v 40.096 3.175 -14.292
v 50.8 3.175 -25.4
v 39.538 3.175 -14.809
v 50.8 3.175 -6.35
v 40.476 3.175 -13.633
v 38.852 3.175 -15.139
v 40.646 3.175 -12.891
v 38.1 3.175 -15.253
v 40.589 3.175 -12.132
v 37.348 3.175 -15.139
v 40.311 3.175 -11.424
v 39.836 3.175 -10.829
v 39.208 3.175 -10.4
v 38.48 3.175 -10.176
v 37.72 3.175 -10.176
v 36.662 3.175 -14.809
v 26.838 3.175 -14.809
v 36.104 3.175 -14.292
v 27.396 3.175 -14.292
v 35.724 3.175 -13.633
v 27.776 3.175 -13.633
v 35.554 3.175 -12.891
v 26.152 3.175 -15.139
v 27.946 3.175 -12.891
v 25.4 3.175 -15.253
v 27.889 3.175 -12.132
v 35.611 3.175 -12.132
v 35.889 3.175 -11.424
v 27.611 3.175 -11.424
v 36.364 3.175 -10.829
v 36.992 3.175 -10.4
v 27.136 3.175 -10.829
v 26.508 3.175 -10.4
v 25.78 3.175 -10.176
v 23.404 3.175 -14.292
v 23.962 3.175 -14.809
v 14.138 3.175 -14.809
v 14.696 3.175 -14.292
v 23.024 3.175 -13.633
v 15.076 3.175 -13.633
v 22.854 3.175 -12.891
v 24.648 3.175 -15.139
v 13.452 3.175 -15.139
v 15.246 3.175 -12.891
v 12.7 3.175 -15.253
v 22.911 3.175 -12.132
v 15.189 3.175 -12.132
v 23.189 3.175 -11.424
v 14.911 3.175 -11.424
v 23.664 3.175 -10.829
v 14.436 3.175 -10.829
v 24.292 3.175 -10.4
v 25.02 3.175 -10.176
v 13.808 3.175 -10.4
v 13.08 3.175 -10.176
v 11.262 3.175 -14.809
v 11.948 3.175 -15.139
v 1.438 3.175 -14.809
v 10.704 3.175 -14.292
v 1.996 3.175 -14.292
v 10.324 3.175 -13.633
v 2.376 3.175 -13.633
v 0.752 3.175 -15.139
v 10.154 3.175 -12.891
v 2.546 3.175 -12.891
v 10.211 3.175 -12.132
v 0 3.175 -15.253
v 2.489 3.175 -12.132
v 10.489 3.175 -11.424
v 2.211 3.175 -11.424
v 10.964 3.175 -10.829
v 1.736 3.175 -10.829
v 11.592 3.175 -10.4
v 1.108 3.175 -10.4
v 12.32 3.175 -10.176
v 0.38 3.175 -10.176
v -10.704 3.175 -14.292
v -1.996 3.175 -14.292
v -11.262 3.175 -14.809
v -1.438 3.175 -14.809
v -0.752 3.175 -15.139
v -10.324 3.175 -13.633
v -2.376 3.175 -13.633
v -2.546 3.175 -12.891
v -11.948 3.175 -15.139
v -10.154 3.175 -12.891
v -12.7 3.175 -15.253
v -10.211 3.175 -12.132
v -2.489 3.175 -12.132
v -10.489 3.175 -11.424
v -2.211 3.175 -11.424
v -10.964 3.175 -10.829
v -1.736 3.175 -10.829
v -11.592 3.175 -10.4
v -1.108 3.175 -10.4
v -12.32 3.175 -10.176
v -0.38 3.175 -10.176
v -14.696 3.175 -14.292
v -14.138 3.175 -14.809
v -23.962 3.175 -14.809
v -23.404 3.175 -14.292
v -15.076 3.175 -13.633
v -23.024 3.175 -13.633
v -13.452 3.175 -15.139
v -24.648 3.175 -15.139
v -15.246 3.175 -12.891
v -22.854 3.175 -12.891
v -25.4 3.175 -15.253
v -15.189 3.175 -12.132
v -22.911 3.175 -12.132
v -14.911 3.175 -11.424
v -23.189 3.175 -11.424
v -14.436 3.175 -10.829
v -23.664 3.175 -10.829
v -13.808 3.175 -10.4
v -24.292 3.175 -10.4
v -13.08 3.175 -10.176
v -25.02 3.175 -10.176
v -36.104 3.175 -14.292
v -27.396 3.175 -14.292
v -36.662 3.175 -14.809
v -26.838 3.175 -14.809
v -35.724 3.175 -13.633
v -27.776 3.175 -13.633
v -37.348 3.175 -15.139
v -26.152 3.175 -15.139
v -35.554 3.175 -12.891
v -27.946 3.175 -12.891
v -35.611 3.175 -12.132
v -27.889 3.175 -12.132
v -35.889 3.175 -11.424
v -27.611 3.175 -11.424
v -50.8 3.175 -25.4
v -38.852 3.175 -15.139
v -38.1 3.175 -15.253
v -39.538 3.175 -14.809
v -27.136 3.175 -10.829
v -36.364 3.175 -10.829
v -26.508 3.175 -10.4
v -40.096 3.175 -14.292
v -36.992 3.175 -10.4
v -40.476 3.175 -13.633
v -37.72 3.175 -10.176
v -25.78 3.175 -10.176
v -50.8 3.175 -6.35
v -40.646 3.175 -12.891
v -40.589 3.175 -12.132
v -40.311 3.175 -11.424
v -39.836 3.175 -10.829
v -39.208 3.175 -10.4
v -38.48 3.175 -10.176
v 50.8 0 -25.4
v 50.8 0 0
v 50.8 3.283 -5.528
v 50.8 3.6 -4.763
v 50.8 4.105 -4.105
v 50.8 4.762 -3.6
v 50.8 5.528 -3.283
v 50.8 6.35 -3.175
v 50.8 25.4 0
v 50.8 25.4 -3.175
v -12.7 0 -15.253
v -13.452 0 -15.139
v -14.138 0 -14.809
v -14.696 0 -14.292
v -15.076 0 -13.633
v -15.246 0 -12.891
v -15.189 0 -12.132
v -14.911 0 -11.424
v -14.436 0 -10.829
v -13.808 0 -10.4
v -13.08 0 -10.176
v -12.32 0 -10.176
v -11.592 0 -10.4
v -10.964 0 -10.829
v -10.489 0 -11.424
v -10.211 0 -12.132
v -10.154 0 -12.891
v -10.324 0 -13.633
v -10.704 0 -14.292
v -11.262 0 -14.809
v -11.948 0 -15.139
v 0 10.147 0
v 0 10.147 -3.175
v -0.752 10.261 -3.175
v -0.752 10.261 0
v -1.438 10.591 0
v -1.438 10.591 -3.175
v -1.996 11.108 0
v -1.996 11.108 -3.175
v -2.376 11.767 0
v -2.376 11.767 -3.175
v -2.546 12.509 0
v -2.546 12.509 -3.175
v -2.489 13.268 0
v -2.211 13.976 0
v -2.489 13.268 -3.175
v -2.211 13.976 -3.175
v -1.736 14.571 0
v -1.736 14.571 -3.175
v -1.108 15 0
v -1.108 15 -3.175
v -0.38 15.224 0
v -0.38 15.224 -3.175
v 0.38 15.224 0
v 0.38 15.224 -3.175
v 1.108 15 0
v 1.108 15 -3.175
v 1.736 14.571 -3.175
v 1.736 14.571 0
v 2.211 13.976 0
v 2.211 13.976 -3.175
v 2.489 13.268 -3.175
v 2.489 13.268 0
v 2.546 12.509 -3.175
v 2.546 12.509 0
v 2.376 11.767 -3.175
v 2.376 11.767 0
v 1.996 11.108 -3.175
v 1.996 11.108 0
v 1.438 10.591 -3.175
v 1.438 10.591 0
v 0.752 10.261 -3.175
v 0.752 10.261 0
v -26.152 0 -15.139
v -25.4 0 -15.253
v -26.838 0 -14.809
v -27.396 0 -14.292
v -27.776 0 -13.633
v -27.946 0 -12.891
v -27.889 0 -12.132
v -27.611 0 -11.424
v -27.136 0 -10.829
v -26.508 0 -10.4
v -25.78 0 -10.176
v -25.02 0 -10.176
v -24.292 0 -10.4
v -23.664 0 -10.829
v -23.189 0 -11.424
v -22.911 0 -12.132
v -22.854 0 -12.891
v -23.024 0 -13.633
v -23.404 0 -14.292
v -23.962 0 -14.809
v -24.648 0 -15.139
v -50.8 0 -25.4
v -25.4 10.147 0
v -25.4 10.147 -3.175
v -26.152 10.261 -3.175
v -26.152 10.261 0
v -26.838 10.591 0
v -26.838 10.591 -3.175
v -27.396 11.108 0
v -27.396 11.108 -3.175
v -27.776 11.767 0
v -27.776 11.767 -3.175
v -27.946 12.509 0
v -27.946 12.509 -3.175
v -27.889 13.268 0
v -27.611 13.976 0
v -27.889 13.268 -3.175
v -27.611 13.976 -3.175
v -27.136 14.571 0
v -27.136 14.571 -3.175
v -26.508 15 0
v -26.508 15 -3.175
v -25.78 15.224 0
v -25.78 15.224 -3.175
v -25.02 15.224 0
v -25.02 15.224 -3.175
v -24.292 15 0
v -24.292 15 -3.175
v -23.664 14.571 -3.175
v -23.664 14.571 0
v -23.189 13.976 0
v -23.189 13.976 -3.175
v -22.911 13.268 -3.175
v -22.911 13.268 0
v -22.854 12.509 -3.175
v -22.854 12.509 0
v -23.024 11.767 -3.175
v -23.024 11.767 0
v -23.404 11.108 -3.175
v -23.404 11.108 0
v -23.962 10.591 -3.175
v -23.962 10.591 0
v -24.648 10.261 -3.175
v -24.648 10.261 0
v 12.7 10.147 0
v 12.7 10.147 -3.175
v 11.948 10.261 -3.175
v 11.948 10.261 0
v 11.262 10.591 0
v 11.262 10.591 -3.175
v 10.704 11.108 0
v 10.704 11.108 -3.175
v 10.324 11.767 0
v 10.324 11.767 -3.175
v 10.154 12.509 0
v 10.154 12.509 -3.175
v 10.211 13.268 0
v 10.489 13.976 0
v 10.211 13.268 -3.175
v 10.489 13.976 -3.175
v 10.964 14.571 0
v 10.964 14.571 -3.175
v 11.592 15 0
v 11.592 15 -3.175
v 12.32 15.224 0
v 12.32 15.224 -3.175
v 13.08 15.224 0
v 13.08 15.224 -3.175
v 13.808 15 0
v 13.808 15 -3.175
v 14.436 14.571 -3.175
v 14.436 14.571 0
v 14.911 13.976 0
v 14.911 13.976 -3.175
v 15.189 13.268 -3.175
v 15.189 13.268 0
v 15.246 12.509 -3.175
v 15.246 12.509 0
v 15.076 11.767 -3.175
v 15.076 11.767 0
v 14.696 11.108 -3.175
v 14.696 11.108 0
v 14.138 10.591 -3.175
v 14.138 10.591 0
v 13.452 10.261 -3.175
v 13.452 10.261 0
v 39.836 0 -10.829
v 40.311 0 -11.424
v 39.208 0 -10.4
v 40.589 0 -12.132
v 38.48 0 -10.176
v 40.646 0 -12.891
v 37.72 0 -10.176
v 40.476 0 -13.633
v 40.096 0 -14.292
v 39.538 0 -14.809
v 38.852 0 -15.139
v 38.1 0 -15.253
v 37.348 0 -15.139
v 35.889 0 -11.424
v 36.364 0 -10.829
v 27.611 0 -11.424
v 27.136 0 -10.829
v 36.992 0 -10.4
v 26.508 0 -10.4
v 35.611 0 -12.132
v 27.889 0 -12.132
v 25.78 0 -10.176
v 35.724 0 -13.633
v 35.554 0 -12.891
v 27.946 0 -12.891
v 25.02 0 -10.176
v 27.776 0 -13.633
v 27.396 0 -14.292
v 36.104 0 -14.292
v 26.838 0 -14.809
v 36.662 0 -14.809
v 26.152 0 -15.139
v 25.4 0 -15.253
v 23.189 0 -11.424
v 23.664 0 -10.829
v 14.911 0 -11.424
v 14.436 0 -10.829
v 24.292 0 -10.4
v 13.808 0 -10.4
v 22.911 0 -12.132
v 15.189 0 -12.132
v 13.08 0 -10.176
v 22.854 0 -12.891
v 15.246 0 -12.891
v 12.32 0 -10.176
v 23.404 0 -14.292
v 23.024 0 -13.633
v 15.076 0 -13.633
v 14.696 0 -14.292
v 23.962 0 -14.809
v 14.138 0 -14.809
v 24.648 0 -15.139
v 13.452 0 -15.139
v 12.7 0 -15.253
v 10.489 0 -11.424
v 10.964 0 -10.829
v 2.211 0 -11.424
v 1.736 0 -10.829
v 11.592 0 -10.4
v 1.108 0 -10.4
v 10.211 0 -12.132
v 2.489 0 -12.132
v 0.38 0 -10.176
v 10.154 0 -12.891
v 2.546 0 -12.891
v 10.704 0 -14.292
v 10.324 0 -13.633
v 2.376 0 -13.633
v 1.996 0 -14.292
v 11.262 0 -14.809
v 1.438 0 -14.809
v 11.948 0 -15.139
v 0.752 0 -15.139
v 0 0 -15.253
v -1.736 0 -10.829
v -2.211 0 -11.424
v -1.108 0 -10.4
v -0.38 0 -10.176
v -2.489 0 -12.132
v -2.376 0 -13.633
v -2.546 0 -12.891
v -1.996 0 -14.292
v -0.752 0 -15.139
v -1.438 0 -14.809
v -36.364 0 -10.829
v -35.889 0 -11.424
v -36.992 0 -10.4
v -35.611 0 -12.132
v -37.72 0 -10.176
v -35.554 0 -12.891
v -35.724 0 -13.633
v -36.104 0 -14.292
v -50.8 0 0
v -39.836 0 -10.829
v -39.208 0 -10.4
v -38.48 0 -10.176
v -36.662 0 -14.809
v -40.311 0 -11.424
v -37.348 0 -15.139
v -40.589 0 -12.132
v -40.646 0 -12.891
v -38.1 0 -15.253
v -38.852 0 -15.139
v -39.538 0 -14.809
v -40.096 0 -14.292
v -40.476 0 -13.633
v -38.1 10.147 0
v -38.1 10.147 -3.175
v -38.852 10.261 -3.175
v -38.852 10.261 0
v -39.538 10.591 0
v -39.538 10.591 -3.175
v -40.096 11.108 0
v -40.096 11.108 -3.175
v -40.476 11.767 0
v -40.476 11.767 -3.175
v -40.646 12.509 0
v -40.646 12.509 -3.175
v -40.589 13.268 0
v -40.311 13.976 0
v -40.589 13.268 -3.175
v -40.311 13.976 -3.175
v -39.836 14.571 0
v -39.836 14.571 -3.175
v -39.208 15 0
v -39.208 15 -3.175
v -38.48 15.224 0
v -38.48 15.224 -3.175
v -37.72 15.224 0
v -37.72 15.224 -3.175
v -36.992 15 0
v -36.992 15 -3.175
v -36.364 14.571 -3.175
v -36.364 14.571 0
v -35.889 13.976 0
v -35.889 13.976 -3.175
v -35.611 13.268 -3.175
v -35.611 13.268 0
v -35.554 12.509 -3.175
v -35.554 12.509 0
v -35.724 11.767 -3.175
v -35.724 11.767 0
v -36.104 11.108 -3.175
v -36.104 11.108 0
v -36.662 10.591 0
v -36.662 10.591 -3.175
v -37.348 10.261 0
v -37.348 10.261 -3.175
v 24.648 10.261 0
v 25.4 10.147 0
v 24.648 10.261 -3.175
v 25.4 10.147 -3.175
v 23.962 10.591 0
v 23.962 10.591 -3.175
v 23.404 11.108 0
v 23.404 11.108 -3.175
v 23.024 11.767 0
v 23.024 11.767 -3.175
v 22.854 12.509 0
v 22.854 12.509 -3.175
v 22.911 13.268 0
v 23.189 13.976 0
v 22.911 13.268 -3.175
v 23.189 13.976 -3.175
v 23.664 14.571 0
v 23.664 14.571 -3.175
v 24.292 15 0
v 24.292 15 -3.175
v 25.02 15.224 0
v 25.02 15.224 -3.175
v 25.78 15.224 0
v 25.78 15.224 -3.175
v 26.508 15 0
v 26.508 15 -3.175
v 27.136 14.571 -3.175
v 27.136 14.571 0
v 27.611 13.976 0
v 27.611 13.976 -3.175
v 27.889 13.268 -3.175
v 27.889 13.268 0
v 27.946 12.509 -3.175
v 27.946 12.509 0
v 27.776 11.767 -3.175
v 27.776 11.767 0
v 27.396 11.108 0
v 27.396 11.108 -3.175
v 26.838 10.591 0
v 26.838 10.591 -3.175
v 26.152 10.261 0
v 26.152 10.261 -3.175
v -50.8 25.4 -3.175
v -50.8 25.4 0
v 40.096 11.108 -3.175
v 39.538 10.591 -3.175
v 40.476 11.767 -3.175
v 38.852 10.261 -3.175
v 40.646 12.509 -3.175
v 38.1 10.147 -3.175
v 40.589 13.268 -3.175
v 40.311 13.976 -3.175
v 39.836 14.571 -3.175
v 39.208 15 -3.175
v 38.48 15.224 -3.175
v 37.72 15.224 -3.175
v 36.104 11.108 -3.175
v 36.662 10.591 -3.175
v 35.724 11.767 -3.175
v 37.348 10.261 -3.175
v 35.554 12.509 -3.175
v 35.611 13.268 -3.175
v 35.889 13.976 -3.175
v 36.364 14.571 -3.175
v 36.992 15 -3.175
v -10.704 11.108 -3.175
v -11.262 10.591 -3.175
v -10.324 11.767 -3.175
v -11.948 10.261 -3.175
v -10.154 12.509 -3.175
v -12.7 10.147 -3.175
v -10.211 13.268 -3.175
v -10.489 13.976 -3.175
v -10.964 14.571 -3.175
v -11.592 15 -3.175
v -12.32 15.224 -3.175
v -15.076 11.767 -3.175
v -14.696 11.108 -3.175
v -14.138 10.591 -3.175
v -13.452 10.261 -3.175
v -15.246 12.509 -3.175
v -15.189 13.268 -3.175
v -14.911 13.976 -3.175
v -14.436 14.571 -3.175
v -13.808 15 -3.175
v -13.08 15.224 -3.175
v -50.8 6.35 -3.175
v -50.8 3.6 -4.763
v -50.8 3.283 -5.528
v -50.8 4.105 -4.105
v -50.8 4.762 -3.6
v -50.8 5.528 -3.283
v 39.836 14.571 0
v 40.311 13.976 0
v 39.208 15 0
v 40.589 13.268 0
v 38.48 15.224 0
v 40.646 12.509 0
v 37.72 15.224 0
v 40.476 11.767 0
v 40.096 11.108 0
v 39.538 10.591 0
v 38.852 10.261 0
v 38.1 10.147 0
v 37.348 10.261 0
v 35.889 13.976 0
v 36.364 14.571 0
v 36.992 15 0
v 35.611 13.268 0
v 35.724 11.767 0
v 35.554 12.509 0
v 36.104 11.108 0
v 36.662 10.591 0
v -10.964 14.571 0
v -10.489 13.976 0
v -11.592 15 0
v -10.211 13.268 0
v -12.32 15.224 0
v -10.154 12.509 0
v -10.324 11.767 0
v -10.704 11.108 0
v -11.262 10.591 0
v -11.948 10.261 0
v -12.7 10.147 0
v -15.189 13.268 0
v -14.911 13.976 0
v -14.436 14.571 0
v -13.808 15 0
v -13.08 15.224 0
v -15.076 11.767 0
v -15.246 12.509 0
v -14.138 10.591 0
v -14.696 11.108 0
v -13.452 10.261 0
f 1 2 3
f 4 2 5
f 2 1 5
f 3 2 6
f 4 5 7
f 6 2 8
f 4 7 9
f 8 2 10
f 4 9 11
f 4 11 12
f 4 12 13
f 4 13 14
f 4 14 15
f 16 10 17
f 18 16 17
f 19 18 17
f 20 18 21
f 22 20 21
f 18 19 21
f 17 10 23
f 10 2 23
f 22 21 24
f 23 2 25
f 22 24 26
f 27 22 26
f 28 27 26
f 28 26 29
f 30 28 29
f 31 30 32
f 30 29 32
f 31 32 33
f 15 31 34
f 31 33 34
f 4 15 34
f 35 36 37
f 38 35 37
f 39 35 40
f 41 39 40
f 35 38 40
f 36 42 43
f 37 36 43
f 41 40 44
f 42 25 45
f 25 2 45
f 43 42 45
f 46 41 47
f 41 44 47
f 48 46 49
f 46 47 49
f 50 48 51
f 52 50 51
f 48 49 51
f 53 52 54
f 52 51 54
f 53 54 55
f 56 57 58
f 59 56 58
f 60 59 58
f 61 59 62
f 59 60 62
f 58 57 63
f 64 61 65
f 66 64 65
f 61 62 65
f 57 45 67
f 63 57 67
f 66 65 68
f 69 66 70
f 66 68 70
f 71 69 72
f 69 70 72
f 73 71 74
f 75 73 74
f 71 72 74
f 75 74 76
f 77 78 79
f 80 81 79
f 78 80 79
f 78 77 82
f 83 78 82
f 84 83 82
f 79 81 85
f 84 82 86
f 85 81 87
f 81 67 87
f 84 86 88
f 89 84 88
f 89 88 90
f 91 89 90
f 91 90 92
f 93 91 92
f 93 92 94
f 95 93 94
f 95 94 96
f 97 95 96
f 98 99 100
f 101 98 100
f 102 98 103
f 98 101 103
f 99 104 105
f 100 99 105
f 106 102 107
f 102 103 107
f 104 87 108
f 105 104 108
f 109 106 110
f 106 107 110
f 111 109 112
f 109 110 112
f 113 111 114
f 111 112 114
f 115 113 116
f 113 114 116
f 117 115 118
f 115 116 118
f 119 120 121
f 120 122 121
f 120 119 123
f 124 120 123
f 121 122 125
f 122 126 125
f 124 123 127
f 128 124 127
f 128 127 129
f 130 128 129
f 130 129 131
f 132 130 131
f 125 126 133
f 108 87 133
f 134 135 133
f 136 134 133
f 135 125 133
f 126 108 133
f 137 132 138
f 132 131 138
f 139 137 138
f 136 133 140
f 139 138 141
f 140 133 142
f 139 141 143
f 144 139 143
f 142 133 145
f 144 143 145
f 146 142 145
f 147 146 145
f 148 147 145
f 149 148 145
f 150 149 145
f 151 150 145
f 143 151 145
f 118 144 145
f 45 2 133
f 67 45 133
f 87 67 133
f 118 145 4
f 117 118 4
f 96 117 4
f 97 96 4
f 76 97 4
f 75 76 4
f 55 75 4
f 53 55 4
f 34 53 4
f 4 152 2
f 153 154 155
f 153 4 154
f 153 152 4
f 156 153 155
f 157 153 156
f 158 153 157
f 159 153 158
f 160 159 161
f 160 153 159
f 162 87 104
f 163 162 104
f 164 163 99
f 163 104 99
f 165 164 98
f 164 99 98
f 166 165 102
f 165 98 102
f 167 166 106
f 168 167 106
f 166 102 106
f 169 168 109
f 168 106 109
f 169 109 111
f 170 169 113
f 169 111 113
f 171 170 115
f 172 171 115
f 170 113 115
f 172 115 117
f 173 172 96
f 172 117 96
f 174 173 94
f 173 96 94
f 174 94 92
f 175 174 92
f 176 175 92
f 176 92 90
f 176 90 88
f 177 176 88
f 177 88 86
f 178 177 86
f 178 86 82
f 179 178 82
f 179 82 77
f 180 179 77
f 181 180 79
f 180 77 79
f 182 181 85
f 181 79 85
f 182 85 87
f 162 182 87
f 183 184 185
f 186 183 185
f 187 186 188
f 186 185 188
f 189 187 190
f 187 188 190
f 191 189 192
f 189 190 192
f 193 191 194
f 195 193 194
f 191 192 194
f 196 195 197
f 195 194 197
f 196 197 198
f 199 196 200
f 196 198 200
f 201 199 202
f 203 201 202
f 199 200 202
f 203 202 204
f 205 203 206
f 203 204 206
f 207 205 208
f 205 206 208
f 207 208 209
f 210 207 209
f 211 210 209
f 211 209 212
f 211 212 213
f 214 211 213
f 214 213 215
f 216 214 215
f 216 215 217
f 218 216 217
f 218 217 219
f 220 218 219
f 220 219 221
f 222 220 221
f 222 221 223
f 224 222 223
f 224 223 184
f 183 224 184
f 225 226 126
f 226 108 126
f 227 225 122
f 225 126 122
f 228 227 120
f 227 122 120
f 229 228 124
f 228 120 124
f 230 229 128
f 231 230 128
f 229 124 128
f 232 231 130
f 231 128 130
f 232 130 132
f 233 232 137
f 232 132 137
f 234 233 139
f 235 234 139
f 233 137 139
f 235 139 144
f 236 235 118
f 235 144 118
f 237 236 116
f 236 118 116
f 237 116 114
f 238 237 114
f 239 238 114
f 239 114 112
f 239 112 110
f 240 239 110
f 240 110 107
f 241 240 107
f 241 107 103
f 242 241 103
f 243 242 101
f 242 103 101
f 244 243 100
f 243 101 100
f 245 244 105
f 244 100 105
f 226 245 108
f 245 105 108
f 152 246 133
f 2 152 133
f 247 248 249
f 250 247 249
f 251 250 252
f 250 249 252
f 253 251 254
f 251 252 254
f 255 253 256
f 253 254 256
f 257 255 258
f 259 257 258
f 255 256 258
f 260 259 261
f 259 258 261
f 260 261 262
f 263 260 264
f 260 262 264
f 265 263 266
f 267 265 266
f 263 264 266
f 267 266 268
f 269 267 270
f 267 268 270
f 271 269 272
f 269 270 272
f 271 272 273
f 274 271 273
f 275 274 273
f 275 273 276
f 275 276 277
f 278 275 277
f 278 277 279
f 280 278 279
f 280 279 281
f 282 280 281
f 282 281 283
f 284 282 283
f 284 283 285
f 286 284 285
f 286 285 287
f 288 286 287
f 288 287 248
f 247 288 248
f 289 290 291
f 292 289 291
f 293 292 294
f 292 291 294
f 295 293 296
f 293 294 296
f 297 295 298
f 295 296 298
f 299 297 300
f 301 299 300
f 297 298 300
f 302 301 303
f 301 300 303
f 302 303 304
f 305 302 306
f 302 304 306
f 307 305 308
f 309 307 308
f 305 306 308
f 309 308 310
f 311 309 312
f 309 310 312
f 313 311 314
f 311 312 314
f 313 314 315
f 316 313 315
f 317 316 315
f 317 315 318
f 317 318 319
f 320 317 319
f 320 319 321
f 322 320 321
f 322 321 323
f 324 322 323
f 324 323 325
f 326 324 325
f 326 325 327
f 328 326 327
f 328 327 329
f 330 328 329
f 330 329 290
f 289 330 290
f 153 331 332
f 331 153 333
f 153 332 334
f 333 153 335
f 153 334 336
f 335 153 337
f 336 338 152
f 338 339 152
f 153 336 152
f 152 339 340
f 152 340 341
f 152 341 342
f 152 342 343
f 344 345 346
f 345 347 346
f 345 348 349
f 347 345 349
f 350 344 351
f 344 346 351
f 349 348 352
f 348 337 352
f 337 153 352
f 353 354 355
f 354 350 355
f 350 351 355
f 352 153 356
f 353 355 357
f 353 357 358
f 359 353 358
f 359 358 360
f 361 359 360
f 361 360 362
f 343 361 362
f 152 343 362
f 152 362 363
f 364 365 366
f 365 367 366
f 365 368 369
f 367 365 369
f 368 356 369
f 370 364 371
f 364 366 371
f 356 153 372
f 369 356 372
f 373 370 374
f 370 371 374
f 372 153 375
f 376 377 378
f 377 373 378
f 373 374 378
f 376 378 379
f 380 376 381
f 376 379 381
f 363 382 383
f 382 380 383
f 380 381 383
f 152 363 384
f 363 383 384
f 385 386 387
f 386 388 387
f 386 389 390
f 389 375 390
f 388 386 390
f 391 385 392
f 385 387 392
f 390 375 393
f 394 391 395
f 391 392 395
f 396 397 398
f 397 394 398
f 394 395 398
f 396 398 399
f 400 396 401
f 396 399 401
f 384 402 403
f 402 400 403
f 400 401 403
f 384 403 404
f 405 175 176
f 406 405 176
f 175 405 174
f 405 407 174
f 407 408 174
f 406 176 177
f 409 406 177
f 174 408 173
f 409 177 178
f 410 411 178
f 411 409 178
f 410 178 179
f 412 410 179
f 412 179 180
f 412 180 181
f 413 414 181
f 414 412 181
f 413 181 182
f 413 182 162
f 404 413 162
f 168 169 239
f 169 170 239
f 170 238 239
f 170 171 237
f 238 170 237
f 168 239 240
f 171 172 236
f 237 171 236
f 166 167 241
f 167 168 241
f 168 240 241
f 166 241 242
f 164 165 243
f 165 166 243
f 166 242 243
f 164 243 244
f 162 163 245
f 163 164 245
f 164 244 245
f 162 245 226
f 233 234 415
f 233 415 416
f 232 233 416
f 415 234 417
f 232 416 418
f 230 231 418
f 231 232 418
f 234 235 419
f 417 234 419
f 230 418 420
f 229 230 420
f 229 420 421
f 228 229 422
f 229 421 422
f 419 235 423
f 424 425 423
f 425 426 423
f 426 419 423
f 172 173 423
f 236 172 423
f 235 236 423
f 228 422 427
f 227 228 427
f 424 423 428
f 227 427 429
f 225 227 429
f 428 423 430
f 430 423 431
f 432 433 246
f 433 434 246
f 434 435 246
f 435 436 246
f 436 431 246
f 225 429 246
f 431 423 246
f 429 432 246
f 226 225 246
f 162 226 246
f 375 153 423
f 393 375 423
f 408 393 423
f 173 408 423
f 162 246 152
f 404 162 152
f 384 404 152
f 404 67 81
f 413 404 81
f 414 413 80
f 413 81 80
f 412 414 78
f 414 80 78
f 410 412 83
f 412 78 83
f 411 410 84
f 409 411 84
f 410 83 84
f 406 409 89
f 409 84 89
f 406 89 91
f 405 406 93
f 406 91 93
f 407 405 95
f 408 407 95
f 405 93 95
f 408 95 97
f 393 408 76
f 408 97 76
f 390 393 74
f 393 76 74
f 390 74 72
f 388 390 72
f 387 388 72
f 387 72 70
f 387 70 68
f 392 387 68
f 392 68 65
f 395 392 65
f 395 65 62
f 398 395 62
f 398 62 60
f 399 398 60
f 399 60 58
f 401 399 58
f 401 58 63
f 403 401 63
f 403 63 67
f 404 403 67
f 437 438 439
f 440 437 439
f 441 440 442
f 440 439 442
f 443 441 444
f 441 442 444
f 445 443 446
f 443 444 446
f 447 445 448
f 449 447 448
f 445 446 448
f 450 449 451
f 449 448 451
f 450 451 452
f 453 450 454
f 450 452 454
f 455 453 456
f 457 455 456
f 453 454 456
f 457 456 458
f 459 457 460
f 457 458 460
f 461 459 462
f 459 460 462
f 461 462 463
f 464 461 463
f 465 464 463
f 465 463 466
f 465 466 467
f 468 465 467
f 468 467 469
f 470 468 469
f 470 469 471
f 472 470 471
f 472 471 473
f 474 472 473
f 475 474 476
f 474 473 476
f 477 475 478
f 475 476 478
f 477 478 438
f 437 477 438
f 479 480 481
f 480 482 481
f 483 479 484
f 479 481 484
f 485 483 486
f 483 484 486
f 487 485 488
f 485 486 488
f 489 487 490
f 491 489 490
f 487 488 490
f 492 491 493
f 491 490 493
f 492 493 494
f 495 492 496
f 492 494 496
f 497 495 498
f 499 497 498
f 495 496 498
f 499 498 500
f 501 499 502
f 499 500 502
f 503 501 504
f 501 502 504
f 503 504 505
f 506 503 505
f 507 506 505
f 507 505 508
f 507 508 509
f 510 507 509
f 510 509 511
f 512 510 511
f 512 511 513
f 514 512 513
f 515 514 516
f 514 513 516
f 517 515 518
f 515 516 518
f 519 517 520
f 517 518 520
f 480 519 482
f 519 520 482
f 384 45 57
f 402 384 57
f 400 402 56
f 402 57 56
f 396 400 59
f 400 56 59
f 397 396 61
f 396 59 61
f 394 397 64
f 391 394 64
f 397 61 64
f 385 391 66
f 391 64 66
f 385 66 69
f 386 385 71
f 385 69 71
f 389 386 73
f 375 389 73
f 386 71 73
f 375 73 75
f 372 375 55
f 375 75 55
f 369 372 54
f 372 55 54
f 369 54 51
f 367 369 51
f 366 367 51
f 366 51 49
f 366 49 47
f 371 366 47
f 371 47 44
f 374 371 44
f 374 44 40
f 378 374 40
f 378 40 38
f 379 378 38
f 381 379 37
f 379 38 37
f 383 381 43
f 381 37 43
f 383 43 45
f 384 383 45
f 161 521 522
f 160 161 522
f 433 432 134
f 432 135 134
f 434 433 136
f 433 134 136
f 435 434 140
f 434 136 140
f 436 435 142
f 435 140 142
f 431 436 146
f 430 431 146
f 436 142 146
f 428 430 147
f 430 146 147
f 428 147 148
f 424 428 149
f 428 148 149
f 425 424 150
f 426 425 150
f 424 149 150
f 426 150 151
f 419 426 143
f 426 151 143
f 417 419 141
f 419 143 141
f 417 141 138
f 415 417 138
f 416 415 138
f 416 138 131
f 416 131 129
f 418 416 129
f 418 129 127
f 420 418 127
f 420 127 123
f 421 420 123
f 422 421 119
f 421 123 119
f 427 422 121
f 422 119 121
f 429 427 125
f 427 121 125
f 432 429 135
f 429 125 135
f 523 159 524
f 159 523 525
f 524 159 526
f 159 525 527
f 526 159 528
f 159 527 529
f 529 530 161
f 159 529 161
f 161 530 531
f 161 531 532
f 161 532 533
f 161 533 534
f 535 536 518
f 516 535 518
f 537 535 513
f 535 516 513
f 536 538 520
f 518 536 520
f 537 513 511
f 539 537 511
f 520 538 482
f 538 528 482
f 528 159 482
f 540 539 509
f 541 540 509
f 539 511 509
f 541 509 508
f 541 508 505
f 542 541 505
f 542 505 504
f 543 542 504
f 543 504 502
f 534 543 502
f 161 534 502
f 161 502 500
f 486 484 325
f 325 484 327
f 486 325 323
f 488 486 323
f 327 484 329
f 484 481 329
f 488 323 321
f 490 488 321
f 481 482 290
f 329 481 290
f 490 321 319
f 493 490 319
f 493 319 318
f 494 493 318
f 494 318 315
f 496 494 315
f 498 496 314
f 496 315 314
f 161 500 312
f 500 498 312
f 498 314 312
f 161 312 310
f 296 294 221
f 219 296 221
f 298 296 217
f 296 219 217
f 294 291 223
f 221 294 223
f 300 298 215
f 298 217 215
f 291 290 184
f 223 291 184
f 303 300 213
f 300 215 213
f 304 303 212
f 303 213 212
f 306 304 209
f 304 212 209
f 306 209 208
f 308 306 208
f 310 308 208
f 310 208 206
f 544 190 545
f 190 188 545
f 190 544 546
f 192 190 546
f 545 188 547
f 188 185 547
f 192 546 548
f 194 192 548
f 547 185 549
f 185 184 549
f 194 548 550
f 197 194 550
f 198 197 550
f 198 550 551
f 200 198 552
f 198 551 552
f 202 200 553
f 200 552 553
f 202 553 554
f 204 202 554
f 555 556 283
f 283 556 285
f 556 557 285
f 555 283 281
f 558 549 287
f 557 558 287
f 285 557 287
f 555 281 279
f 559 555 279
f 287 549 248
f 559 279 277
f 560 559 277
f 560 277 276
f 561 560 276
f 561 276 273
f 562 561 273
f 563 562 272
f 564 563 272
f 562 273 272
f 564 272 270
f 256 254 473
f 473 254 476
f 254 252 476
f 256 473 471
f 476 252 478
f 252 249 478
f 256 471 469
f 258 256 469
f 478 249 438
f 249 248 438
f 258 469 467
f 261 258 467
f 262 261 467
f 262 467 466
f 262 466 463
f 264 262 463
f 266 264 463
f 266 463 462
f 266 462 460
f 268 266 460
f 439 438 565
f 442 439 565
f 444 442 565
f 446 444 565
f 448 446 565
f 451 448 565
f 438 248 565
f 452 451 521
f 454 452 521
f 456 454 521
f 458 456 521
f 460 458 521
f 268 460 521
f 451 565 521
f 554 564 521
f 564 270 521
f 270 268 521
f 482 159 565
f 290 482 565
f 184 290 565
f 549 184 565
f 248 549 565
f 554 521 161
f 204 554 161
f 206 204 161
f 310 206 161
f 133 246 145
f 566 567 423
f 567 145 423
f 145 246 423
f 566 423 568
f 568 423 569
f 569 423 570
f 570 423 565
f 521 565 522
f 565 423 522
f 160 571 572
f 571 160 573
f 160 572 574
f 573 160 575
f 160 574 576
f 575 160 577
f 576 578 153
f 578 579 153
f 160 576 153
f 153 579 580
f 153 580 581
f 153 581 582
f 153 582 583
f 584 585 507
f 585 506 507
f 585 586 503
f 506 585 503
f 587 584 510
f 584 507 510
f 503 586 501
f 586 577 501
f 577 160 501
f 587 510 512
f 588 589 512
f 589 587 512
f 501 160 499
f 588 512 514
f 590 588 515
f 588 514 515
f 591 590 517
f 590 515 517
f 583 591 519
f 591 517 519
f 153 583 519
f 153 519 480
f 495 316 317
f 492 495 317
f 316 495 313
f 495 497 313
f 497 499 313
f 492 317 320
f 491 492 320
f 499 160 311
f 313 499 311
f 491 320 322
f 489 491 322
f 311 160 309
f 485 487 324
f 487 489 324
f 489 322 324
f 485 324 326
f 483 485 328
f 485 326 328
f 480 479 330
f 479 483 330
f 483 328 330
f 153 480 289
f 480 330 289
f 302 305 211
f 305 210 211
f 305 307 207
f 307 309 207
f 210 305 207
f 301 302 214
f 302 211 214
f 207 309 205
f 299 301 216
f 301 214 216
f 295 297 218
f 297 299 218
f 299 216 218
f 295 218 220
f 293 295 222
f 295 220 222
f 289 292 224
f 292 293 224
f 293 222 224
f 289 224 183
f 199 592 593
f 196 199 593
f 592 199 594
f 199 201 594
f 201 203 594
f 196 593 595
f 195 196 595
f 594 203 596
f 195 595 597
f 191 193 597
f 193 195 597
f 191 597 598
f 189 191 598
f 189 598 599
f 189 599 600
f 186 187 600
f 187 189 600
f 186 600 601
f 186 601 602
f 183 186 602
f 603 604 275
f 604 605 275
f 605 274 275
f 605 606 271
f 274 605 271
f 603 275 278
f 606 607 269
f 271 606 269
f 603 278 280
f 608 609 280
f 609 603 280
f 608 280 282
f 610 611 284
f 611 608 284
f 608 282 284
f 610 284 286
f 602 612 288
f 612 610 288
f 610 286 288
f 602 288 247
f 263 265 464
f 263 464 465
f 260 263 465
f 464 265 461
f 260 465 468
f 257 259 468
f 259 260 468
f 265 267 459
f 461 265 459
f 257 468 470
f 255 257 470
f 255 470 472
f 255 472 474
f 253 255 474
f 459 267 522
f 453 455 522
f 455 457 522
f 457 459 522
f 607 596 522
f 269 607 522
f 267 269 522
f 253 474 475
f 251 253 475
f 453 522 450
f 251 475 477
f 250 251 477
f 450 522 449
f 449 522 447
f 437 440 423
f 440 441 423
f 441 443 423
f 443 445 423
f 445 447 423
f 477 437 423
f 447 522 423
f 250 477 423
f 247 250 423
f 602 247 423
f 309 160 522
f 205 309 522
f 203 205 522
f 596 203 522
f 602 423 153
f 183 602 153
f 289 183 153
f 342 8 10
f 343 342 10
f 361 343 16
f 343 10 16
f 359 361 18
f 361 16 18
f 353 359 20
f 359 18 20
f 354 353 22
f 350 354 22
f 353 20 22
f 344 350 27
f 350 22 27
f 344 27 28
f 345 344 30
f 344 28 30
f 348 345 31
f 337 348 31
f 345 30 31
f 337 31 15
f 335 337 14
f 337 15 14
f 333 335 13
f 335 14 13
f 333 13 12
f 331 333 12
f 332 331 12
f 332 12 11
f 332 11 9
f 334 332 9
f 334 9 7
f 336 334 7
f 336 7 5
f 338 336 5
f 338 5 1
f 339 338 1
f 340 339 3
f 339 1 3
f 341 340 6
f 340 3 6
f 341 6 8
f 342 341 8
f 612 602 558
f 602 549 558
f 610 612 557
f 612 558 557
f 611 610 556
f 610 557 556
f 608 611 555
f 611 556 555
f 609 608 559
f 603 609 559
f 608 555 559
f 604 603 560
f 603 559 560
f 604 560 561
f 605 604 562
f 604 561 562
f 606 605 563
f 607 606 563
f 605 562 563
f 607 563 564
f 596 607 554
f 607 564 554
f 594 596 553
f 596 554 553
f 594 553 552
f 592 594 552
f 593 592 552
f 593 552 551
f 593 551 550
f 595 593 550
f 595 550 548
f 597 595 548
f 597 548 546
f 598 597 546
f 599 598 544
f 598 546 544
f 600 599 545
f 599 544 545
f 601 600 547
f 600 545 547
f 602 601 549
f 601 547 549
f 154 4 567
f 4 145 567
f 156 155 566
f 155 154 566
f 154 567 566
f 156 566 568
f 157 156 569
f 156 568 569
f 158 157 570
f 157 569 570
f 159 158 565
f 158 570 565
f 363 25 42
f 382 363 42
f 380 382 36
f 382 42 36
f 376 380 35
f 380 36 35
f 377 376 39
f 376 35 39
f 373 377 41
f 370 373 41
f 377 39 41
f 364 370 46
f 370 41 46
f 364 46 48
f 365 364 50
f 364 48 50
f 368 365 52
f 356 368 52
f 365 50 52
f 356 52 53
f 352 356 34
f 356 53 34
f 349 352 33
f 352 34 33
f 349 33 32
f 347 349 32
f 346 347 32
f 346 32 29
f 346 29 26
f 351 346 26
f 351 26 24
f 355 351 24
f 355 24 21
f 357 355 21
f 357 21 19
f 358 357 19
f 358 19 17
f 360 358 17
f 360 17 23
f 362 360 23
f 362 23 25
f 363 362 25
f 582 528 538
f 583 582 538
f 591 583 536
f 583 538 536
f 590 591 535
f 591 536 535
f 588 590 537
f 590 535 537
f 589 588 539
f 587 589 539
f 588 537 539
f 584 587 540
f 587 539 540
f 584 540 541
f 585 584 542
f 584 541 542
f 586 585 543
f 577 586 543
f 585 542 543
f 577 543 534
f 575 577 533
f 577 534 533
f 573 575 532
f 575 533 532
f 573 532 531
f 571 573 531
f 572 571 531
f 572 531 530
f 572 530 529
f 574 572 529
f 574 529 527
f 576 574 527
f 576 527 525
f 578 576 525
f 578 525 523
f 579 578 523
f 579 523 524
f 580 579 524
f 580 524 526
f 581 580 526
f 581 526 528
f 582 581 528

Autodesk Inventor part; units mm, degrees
ref_plane "YZ Plane" through (0, 0, 0) normal (1, 0, 0) x (0, 1, 0)
ref_plane "XZ Plane" through (0, 0, 0) normal (0, 1, 0) x (-1, 0, 0)
ref_plane "XY Plane" through (0, 0, 0) normal (0, 0, 1) x (1, 0, 0)
sketch "Sketch1" plane through (0, 0, 0) normal (1, 0, 0) x (0, 1, 0)
  line L0 (25.4, 0) -> (0, 0)
  line L1 (0, 0) -> (0, -25.4)
  line L2 (0, -25.4) -> (3.175, -25.4)
  line L3 (3.175, -25.4) -> (3.175, -3.175)
  line L4 (3.175, -3.175) -> (25.4, -3.175)
  line L5 (25.4, -3.175) -> (25.4, 0)
  dimension "d0" = 25.4
  dimension "d1" = 25.4
  dimension "d2" = 3.175
extrude "Extrusion1" add sketch "Sketch1" along normal mid plane 101.6
fillet "Fillet1" radius 3.175 1 edges at (0, 3.175, -3.175)
sketch "Sketch2" plane through (-50.8, 0, 0) normal (0, 0, 1) x (1, 0, 0)
  line L0 (0, 0) -> (0, 25.4) projected
  line L1 (101.6, 0) -> (0, 0) projected
  point P0 (50.8, 0)
  point P1 (12.7, 12.7)
  point P2 (0, 12.7)
  point P3 (25.4, 12.7)
  point P4 (38.1, 12.7)
  point P5 (50.8, 12.7)
  point P6 (63.5, 12.7)
  point P7 (76.2, 12.7)
  point P8 (88.9, 12.7)
  dimension "d6" = 12.7
  dimension "d9" = 12.7
hole "Hole1" at (-38.1, 12.7, 0) at (-25.4, 12.7, 0) at (-12.7, 12.7, 0) at (0, 12.7, 0) at (12.7, 12.7, 0) at (25.4, 12.7, 0) at (38.1, 12.7, 0) direction (0, 0, -1) diameter 5.1054 end through all clearance for "Flat Head Machine Screw (82)" size "#10" standard "Ansi Unified Screw Threads"
sketch "Sketch3" plane through (-50.8, 0, -25.4) normal (0, -1, 0) x (1, 0, 0)
  line L0 (0, 0) -> (0, 25.4) projected
  line L1 (101.6, 25.4) -> (0, 25.4) projected
  point P0 (50.8, 25.4)
  point P1 (12.7, 12.7)
  point P2 (0, 12.7)
  point P3 (25.4, 12.7)
  point P4 (38.1, 12.7)
  point P5 (50.8, 12.7)
  point P6 (63.5, 12.7)
  point P7 (76.2, 12.7)
  point P8 (88.9, 12.7)
  dimension "d21" = 12.7
  dimension "d24" = 12.7
hole "Hole2" at (-38.1, 0, -12.7) at (-25.4, 0, -12.7) at (-12.7, 0, -12.7) at (0, 0, -12.7) at (12.7, 0, -12.7) at (25.4, 0, -12.7) at (38.1, 0, -12.7) direction (0, 1, 0) diameter 5.1054 end through all clearance for "Flat Head Machine Screw (82)" size "#10" standard "Ansi Unified Screw Threads"
equation "\"d1\" = d0"
properties part number "GI - 008" material "Aluminum 6061"
